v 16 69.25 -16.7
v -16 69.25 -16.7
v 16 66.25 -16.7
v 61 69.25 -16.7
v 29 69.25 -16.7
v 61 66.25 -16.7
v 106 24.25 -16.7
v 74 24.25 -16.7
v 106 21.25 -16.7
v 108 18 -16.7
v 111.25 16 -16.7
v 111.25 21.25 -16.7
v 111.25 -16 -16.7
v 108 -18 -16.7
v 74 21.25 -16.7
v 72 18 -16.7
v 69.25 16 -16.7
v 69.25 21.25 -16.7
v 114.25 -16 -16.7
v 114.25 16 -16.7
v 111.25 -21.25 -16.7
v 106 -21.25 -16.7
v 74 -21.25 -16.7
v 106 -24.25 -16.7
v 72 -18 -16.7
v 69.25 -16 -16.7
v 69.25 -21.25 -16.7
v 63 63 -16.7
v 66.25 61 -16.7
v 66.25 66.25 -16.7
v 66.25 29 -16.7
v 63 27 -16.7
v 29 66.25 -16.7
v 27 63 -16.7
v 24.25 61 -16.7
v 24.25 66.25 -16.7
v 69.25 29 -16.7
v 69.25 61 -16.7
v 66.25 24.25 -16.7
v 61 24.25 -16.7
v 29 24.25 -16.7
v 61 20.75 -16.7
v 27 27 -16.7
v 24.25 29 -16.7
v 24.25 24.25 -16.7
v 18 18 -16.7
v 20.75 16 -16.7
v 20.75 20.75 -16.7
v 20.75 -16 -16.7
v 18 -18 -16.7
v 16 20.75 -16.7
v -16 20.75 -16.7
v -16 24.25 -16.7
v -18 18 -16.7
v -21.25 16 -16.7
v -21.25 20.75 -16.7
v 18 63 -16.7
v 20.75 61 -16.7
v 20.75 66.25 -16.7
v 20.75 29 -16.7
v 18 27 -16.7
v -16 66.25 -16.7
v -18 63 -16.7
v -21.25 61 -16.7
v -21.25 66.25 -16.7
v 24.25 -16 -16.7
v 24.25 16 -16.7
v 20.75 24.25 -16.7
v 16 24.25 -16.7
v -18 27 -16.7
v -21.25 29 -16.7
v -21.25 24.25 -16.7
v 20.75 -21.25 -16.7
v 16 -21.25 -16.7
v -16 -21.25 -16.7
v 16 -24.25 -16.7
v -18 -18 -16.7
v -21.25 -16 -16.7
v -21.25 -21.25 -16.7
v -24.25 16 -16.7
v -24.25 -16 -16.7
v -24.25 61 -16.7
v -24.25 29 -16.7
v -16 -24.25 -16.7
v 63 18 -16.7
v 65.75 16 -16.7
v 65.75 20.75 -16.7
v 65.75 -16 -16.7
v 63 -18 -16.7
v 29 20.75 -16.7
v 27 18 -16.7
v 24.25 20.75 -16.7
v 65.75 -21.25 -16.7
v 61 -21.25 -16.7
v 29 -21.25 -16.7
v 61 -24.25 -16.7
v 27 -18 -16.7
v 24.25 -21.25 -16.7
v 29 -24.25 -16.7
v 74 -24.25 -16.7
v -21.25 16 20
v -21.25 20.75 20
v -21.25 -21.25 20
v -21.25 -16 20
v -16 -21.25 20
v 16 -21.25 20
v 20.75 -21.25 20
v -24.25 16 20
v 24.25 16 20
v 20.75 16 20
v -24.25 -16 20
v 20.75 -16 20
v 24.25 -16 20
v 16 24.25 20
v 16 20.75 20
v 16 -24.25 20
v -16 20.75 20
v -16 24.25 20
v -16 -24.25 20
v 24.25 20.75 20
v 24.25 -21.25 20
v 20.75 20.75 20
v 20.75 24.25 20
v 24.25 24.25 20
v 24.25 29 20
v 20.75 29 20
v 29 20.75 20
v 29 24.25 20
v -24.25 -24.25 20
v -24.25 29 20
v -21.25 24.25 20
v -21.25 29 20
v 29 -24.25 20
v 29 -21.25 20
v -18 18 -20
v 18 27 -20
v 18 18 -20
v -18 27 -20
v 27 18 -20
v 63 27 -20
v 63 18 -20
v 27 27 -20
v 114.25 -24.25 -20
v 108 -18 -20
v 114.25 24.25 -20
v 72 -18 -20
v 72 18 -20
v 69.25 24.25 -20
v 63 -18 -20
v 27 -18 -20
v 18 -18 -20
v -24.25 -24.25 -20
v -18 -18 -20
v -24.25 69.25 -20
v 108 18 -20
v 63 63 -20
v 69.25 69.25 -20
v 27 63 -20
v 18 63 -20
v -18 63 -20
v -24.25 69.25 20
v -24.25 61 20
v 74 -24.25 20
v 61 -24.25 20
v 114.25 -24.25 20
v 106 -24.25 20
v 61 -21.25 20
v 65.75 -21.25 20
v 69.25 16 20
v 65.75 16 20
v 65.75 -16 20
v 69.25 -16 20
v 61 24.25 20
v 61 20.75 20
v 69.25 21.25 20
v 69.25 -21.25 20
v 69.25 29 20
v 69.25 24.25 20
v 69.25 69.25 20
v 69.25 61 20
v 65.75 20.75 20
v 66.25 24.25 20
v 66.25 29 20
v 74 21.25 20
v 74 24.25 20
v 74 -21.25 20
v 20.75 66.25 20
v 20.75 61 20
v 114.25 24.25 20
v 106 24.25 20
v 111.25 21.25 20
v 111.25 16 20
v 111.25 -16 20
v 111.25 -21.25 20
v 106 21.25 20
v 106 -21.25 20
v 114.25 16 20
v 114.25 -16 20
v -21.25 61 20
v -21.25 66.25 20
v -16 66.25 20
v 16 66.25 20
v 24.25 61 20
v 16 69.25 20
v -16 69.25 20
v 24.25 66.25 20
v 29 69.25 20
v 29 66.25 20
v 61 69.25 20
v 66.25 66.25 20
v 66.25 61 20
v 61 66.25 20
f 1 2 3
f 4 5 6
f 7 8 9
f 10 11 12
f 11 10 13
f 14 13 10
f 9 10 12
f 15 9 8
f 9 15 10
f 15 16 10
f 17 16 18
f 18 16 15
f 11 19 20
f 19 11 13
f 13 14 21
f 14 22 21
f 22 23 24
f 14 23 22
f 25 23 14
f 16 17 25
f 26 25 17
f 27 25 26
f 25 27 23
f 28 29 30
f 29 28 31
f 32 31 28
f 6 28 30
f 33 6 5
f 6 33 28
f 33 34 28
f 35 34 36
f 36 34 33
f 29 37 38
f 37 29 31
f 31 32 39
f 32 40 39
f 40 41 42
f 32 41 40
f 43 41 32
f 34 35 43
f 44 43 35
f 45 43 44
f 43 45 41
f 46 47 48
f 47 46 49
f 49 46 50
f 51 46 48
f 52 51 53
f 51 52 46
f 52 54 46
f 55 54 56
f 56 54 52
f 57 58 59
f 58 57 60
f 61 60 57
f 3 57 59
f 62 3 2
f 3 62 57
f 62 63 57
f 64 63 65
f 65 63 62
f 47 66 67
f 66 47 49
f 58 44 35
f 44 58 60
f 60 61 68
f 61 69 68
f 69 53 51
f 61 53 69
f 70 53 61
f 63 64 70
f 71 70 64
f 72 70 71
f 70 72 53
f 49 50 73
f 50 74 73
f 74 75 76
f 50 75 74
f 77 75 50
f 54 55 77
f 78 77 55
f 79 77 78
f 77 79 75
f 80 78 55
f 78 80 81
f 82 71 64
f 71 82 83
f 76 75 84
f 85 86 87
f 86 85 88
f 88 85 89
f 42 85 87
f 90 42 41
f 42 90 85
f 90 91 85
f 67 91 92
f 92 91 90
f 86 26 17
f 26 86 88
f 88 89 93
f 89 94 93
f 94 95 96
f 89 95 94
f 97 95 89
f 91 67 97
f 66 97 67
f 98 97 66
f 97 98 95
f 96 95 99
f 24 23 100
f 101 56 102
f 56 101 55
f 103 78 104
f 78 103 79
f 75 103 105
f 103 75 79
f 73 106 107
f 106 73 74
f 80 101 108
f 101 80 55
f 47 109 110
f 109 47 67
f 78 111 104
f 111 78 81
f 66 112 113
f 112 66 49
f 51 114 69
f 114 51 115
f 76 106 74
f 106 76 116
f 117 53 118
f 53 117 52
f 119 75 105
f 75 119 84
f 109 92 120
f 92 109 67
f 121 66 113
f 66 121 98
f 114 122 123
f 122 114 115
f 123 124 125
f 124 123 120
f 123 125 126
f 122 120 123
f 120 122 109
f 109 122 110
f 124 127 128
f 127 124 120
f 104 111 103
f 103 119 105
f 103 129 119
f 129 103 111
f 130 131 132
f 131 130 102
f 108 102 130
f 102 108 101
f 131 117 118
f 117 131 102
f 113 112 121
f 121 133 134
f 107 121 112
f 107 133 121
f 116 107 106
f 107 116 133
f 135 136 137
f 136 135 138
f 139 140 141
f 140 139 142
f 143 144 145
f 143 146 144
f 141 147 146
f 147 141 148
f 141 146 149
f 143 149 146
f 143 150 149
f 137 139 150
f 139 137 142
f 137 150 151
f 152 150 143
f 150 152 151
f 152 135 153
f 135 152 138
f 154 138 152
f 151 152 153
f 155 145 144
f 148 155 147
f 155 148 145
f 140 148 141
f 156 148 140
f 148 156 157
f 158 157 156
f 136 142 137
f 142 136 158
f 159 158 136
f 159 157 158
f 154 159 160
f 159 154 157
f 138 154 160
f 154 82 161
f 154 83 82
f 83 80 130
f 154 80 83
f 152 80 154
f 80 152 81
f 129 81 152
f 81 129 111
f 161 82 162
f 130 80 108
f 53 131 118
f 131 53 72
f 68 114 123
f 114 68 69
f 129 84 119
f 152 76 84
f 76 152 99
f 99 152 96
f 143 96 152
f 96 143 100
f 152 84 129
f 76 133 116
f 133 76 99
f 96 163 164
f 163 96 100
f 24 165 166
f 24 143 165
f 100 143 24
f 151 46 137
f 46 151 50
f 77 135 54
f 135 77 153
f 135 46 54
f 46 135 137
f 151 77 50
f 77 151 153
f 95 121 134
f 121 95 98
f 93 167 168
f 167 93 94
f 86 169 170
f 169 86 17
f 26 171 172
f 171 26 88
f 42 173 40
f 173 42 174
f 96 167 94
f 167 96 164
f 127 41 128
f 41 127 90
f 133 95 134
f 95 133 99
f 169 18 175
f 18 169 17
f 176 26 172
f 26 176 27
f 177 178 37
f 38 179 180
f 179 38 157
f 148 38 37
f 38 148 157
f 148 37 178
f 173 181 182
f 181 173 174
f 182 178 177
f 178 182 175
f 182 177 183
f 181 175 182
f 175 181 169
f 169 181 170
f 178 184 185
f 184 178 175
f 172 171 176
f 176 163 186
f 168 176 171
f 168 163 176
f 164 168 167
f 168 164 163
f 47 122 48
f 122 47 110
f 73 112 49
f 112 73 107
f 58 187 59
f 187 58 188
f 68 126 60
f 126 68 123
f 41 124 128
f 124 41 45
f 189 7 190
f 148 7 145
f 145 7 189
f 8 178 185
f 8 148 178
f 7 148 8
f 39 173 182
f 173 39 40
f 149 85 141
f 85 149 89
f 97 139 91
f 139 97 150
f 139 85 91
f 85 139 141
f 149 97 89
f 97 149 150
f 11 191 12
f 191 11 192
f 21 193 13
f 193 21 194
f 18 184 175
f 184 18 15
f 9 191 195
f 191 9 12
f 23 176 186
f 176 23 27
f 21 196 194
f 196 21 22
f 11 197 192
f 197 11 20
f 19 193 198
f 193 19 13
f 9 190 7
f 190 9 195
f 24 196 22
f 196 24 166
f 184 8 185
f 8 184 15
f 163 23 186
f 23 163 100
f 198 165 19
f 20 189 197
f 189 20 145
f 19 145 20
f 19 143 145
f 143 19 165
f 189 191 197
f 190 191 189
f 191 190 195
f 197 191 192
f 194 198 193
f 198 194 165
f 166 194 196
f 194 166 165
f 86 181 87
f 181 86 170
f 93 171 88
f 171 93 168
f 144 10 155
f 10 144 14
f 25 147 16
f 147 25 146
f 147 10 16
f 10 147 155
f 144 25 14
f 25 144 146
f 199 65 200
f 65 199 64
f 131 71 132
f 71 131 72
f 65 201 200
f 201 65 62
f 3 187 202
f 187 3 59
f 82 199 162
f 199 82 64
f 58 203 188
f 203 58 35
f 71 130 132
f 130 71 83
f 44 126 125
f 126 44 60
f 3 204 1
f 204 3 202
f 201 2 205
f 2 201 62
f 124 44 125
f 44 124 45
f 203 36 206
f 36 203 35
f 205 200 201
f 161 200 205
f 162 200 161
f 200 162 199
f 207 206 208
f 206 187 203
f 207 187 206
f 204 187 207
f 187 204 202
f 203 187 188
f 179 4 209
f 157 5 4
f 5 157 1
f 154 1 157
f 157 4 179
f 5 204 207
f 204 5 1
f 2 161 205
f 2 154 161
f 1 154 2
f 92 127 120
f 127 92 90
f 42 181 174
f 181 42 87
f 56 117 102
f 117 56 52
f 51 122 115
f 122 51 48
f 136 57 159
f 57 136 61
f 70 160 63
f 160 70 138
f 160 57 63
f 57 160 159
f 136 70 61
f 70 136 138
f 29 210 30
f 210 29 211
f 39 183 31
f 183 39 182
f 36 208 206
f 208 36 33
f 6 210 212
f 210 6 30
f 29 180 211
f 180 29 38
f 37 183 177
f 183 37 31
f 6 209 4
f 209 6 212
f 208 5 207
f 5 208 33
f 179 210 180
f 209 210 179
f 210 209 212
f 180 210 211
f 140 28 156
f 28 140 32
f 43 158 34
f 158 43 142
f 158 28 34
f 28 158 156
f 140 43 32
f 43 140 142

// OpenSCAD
module motor_mount(
size = 42.5,
size_grid_cut = 32,
size_z_cut = 36,
height=40,
wall_thickness=3.0,
bottom_thickness=3.3){

difference(){
    cube([size+wall_thickness*2,size+wall_thickness*2,height], center=true);
    
    translate([0,0,bottom_thickness]){
        cube([size,size,height], center=true);
        cube([size_grid_cut*2,size_grid_cut,height], center=true);   
        cube([size_grid_cut,size_grid_cut*2,height], center=true);   
    
    
    }
    translate([0,0,-1]) cube([size_z_cut,size_z_cut,height], center=true); 
        
}
}

union(){
    motor_mount();
    translate([45,0,0]) motor_mount();
    translate([45*2,0,0]) motor_mount();
    translate([0,45,0]) motor_mount();
    translate([45,45,0]) motor_mount();
    

}
